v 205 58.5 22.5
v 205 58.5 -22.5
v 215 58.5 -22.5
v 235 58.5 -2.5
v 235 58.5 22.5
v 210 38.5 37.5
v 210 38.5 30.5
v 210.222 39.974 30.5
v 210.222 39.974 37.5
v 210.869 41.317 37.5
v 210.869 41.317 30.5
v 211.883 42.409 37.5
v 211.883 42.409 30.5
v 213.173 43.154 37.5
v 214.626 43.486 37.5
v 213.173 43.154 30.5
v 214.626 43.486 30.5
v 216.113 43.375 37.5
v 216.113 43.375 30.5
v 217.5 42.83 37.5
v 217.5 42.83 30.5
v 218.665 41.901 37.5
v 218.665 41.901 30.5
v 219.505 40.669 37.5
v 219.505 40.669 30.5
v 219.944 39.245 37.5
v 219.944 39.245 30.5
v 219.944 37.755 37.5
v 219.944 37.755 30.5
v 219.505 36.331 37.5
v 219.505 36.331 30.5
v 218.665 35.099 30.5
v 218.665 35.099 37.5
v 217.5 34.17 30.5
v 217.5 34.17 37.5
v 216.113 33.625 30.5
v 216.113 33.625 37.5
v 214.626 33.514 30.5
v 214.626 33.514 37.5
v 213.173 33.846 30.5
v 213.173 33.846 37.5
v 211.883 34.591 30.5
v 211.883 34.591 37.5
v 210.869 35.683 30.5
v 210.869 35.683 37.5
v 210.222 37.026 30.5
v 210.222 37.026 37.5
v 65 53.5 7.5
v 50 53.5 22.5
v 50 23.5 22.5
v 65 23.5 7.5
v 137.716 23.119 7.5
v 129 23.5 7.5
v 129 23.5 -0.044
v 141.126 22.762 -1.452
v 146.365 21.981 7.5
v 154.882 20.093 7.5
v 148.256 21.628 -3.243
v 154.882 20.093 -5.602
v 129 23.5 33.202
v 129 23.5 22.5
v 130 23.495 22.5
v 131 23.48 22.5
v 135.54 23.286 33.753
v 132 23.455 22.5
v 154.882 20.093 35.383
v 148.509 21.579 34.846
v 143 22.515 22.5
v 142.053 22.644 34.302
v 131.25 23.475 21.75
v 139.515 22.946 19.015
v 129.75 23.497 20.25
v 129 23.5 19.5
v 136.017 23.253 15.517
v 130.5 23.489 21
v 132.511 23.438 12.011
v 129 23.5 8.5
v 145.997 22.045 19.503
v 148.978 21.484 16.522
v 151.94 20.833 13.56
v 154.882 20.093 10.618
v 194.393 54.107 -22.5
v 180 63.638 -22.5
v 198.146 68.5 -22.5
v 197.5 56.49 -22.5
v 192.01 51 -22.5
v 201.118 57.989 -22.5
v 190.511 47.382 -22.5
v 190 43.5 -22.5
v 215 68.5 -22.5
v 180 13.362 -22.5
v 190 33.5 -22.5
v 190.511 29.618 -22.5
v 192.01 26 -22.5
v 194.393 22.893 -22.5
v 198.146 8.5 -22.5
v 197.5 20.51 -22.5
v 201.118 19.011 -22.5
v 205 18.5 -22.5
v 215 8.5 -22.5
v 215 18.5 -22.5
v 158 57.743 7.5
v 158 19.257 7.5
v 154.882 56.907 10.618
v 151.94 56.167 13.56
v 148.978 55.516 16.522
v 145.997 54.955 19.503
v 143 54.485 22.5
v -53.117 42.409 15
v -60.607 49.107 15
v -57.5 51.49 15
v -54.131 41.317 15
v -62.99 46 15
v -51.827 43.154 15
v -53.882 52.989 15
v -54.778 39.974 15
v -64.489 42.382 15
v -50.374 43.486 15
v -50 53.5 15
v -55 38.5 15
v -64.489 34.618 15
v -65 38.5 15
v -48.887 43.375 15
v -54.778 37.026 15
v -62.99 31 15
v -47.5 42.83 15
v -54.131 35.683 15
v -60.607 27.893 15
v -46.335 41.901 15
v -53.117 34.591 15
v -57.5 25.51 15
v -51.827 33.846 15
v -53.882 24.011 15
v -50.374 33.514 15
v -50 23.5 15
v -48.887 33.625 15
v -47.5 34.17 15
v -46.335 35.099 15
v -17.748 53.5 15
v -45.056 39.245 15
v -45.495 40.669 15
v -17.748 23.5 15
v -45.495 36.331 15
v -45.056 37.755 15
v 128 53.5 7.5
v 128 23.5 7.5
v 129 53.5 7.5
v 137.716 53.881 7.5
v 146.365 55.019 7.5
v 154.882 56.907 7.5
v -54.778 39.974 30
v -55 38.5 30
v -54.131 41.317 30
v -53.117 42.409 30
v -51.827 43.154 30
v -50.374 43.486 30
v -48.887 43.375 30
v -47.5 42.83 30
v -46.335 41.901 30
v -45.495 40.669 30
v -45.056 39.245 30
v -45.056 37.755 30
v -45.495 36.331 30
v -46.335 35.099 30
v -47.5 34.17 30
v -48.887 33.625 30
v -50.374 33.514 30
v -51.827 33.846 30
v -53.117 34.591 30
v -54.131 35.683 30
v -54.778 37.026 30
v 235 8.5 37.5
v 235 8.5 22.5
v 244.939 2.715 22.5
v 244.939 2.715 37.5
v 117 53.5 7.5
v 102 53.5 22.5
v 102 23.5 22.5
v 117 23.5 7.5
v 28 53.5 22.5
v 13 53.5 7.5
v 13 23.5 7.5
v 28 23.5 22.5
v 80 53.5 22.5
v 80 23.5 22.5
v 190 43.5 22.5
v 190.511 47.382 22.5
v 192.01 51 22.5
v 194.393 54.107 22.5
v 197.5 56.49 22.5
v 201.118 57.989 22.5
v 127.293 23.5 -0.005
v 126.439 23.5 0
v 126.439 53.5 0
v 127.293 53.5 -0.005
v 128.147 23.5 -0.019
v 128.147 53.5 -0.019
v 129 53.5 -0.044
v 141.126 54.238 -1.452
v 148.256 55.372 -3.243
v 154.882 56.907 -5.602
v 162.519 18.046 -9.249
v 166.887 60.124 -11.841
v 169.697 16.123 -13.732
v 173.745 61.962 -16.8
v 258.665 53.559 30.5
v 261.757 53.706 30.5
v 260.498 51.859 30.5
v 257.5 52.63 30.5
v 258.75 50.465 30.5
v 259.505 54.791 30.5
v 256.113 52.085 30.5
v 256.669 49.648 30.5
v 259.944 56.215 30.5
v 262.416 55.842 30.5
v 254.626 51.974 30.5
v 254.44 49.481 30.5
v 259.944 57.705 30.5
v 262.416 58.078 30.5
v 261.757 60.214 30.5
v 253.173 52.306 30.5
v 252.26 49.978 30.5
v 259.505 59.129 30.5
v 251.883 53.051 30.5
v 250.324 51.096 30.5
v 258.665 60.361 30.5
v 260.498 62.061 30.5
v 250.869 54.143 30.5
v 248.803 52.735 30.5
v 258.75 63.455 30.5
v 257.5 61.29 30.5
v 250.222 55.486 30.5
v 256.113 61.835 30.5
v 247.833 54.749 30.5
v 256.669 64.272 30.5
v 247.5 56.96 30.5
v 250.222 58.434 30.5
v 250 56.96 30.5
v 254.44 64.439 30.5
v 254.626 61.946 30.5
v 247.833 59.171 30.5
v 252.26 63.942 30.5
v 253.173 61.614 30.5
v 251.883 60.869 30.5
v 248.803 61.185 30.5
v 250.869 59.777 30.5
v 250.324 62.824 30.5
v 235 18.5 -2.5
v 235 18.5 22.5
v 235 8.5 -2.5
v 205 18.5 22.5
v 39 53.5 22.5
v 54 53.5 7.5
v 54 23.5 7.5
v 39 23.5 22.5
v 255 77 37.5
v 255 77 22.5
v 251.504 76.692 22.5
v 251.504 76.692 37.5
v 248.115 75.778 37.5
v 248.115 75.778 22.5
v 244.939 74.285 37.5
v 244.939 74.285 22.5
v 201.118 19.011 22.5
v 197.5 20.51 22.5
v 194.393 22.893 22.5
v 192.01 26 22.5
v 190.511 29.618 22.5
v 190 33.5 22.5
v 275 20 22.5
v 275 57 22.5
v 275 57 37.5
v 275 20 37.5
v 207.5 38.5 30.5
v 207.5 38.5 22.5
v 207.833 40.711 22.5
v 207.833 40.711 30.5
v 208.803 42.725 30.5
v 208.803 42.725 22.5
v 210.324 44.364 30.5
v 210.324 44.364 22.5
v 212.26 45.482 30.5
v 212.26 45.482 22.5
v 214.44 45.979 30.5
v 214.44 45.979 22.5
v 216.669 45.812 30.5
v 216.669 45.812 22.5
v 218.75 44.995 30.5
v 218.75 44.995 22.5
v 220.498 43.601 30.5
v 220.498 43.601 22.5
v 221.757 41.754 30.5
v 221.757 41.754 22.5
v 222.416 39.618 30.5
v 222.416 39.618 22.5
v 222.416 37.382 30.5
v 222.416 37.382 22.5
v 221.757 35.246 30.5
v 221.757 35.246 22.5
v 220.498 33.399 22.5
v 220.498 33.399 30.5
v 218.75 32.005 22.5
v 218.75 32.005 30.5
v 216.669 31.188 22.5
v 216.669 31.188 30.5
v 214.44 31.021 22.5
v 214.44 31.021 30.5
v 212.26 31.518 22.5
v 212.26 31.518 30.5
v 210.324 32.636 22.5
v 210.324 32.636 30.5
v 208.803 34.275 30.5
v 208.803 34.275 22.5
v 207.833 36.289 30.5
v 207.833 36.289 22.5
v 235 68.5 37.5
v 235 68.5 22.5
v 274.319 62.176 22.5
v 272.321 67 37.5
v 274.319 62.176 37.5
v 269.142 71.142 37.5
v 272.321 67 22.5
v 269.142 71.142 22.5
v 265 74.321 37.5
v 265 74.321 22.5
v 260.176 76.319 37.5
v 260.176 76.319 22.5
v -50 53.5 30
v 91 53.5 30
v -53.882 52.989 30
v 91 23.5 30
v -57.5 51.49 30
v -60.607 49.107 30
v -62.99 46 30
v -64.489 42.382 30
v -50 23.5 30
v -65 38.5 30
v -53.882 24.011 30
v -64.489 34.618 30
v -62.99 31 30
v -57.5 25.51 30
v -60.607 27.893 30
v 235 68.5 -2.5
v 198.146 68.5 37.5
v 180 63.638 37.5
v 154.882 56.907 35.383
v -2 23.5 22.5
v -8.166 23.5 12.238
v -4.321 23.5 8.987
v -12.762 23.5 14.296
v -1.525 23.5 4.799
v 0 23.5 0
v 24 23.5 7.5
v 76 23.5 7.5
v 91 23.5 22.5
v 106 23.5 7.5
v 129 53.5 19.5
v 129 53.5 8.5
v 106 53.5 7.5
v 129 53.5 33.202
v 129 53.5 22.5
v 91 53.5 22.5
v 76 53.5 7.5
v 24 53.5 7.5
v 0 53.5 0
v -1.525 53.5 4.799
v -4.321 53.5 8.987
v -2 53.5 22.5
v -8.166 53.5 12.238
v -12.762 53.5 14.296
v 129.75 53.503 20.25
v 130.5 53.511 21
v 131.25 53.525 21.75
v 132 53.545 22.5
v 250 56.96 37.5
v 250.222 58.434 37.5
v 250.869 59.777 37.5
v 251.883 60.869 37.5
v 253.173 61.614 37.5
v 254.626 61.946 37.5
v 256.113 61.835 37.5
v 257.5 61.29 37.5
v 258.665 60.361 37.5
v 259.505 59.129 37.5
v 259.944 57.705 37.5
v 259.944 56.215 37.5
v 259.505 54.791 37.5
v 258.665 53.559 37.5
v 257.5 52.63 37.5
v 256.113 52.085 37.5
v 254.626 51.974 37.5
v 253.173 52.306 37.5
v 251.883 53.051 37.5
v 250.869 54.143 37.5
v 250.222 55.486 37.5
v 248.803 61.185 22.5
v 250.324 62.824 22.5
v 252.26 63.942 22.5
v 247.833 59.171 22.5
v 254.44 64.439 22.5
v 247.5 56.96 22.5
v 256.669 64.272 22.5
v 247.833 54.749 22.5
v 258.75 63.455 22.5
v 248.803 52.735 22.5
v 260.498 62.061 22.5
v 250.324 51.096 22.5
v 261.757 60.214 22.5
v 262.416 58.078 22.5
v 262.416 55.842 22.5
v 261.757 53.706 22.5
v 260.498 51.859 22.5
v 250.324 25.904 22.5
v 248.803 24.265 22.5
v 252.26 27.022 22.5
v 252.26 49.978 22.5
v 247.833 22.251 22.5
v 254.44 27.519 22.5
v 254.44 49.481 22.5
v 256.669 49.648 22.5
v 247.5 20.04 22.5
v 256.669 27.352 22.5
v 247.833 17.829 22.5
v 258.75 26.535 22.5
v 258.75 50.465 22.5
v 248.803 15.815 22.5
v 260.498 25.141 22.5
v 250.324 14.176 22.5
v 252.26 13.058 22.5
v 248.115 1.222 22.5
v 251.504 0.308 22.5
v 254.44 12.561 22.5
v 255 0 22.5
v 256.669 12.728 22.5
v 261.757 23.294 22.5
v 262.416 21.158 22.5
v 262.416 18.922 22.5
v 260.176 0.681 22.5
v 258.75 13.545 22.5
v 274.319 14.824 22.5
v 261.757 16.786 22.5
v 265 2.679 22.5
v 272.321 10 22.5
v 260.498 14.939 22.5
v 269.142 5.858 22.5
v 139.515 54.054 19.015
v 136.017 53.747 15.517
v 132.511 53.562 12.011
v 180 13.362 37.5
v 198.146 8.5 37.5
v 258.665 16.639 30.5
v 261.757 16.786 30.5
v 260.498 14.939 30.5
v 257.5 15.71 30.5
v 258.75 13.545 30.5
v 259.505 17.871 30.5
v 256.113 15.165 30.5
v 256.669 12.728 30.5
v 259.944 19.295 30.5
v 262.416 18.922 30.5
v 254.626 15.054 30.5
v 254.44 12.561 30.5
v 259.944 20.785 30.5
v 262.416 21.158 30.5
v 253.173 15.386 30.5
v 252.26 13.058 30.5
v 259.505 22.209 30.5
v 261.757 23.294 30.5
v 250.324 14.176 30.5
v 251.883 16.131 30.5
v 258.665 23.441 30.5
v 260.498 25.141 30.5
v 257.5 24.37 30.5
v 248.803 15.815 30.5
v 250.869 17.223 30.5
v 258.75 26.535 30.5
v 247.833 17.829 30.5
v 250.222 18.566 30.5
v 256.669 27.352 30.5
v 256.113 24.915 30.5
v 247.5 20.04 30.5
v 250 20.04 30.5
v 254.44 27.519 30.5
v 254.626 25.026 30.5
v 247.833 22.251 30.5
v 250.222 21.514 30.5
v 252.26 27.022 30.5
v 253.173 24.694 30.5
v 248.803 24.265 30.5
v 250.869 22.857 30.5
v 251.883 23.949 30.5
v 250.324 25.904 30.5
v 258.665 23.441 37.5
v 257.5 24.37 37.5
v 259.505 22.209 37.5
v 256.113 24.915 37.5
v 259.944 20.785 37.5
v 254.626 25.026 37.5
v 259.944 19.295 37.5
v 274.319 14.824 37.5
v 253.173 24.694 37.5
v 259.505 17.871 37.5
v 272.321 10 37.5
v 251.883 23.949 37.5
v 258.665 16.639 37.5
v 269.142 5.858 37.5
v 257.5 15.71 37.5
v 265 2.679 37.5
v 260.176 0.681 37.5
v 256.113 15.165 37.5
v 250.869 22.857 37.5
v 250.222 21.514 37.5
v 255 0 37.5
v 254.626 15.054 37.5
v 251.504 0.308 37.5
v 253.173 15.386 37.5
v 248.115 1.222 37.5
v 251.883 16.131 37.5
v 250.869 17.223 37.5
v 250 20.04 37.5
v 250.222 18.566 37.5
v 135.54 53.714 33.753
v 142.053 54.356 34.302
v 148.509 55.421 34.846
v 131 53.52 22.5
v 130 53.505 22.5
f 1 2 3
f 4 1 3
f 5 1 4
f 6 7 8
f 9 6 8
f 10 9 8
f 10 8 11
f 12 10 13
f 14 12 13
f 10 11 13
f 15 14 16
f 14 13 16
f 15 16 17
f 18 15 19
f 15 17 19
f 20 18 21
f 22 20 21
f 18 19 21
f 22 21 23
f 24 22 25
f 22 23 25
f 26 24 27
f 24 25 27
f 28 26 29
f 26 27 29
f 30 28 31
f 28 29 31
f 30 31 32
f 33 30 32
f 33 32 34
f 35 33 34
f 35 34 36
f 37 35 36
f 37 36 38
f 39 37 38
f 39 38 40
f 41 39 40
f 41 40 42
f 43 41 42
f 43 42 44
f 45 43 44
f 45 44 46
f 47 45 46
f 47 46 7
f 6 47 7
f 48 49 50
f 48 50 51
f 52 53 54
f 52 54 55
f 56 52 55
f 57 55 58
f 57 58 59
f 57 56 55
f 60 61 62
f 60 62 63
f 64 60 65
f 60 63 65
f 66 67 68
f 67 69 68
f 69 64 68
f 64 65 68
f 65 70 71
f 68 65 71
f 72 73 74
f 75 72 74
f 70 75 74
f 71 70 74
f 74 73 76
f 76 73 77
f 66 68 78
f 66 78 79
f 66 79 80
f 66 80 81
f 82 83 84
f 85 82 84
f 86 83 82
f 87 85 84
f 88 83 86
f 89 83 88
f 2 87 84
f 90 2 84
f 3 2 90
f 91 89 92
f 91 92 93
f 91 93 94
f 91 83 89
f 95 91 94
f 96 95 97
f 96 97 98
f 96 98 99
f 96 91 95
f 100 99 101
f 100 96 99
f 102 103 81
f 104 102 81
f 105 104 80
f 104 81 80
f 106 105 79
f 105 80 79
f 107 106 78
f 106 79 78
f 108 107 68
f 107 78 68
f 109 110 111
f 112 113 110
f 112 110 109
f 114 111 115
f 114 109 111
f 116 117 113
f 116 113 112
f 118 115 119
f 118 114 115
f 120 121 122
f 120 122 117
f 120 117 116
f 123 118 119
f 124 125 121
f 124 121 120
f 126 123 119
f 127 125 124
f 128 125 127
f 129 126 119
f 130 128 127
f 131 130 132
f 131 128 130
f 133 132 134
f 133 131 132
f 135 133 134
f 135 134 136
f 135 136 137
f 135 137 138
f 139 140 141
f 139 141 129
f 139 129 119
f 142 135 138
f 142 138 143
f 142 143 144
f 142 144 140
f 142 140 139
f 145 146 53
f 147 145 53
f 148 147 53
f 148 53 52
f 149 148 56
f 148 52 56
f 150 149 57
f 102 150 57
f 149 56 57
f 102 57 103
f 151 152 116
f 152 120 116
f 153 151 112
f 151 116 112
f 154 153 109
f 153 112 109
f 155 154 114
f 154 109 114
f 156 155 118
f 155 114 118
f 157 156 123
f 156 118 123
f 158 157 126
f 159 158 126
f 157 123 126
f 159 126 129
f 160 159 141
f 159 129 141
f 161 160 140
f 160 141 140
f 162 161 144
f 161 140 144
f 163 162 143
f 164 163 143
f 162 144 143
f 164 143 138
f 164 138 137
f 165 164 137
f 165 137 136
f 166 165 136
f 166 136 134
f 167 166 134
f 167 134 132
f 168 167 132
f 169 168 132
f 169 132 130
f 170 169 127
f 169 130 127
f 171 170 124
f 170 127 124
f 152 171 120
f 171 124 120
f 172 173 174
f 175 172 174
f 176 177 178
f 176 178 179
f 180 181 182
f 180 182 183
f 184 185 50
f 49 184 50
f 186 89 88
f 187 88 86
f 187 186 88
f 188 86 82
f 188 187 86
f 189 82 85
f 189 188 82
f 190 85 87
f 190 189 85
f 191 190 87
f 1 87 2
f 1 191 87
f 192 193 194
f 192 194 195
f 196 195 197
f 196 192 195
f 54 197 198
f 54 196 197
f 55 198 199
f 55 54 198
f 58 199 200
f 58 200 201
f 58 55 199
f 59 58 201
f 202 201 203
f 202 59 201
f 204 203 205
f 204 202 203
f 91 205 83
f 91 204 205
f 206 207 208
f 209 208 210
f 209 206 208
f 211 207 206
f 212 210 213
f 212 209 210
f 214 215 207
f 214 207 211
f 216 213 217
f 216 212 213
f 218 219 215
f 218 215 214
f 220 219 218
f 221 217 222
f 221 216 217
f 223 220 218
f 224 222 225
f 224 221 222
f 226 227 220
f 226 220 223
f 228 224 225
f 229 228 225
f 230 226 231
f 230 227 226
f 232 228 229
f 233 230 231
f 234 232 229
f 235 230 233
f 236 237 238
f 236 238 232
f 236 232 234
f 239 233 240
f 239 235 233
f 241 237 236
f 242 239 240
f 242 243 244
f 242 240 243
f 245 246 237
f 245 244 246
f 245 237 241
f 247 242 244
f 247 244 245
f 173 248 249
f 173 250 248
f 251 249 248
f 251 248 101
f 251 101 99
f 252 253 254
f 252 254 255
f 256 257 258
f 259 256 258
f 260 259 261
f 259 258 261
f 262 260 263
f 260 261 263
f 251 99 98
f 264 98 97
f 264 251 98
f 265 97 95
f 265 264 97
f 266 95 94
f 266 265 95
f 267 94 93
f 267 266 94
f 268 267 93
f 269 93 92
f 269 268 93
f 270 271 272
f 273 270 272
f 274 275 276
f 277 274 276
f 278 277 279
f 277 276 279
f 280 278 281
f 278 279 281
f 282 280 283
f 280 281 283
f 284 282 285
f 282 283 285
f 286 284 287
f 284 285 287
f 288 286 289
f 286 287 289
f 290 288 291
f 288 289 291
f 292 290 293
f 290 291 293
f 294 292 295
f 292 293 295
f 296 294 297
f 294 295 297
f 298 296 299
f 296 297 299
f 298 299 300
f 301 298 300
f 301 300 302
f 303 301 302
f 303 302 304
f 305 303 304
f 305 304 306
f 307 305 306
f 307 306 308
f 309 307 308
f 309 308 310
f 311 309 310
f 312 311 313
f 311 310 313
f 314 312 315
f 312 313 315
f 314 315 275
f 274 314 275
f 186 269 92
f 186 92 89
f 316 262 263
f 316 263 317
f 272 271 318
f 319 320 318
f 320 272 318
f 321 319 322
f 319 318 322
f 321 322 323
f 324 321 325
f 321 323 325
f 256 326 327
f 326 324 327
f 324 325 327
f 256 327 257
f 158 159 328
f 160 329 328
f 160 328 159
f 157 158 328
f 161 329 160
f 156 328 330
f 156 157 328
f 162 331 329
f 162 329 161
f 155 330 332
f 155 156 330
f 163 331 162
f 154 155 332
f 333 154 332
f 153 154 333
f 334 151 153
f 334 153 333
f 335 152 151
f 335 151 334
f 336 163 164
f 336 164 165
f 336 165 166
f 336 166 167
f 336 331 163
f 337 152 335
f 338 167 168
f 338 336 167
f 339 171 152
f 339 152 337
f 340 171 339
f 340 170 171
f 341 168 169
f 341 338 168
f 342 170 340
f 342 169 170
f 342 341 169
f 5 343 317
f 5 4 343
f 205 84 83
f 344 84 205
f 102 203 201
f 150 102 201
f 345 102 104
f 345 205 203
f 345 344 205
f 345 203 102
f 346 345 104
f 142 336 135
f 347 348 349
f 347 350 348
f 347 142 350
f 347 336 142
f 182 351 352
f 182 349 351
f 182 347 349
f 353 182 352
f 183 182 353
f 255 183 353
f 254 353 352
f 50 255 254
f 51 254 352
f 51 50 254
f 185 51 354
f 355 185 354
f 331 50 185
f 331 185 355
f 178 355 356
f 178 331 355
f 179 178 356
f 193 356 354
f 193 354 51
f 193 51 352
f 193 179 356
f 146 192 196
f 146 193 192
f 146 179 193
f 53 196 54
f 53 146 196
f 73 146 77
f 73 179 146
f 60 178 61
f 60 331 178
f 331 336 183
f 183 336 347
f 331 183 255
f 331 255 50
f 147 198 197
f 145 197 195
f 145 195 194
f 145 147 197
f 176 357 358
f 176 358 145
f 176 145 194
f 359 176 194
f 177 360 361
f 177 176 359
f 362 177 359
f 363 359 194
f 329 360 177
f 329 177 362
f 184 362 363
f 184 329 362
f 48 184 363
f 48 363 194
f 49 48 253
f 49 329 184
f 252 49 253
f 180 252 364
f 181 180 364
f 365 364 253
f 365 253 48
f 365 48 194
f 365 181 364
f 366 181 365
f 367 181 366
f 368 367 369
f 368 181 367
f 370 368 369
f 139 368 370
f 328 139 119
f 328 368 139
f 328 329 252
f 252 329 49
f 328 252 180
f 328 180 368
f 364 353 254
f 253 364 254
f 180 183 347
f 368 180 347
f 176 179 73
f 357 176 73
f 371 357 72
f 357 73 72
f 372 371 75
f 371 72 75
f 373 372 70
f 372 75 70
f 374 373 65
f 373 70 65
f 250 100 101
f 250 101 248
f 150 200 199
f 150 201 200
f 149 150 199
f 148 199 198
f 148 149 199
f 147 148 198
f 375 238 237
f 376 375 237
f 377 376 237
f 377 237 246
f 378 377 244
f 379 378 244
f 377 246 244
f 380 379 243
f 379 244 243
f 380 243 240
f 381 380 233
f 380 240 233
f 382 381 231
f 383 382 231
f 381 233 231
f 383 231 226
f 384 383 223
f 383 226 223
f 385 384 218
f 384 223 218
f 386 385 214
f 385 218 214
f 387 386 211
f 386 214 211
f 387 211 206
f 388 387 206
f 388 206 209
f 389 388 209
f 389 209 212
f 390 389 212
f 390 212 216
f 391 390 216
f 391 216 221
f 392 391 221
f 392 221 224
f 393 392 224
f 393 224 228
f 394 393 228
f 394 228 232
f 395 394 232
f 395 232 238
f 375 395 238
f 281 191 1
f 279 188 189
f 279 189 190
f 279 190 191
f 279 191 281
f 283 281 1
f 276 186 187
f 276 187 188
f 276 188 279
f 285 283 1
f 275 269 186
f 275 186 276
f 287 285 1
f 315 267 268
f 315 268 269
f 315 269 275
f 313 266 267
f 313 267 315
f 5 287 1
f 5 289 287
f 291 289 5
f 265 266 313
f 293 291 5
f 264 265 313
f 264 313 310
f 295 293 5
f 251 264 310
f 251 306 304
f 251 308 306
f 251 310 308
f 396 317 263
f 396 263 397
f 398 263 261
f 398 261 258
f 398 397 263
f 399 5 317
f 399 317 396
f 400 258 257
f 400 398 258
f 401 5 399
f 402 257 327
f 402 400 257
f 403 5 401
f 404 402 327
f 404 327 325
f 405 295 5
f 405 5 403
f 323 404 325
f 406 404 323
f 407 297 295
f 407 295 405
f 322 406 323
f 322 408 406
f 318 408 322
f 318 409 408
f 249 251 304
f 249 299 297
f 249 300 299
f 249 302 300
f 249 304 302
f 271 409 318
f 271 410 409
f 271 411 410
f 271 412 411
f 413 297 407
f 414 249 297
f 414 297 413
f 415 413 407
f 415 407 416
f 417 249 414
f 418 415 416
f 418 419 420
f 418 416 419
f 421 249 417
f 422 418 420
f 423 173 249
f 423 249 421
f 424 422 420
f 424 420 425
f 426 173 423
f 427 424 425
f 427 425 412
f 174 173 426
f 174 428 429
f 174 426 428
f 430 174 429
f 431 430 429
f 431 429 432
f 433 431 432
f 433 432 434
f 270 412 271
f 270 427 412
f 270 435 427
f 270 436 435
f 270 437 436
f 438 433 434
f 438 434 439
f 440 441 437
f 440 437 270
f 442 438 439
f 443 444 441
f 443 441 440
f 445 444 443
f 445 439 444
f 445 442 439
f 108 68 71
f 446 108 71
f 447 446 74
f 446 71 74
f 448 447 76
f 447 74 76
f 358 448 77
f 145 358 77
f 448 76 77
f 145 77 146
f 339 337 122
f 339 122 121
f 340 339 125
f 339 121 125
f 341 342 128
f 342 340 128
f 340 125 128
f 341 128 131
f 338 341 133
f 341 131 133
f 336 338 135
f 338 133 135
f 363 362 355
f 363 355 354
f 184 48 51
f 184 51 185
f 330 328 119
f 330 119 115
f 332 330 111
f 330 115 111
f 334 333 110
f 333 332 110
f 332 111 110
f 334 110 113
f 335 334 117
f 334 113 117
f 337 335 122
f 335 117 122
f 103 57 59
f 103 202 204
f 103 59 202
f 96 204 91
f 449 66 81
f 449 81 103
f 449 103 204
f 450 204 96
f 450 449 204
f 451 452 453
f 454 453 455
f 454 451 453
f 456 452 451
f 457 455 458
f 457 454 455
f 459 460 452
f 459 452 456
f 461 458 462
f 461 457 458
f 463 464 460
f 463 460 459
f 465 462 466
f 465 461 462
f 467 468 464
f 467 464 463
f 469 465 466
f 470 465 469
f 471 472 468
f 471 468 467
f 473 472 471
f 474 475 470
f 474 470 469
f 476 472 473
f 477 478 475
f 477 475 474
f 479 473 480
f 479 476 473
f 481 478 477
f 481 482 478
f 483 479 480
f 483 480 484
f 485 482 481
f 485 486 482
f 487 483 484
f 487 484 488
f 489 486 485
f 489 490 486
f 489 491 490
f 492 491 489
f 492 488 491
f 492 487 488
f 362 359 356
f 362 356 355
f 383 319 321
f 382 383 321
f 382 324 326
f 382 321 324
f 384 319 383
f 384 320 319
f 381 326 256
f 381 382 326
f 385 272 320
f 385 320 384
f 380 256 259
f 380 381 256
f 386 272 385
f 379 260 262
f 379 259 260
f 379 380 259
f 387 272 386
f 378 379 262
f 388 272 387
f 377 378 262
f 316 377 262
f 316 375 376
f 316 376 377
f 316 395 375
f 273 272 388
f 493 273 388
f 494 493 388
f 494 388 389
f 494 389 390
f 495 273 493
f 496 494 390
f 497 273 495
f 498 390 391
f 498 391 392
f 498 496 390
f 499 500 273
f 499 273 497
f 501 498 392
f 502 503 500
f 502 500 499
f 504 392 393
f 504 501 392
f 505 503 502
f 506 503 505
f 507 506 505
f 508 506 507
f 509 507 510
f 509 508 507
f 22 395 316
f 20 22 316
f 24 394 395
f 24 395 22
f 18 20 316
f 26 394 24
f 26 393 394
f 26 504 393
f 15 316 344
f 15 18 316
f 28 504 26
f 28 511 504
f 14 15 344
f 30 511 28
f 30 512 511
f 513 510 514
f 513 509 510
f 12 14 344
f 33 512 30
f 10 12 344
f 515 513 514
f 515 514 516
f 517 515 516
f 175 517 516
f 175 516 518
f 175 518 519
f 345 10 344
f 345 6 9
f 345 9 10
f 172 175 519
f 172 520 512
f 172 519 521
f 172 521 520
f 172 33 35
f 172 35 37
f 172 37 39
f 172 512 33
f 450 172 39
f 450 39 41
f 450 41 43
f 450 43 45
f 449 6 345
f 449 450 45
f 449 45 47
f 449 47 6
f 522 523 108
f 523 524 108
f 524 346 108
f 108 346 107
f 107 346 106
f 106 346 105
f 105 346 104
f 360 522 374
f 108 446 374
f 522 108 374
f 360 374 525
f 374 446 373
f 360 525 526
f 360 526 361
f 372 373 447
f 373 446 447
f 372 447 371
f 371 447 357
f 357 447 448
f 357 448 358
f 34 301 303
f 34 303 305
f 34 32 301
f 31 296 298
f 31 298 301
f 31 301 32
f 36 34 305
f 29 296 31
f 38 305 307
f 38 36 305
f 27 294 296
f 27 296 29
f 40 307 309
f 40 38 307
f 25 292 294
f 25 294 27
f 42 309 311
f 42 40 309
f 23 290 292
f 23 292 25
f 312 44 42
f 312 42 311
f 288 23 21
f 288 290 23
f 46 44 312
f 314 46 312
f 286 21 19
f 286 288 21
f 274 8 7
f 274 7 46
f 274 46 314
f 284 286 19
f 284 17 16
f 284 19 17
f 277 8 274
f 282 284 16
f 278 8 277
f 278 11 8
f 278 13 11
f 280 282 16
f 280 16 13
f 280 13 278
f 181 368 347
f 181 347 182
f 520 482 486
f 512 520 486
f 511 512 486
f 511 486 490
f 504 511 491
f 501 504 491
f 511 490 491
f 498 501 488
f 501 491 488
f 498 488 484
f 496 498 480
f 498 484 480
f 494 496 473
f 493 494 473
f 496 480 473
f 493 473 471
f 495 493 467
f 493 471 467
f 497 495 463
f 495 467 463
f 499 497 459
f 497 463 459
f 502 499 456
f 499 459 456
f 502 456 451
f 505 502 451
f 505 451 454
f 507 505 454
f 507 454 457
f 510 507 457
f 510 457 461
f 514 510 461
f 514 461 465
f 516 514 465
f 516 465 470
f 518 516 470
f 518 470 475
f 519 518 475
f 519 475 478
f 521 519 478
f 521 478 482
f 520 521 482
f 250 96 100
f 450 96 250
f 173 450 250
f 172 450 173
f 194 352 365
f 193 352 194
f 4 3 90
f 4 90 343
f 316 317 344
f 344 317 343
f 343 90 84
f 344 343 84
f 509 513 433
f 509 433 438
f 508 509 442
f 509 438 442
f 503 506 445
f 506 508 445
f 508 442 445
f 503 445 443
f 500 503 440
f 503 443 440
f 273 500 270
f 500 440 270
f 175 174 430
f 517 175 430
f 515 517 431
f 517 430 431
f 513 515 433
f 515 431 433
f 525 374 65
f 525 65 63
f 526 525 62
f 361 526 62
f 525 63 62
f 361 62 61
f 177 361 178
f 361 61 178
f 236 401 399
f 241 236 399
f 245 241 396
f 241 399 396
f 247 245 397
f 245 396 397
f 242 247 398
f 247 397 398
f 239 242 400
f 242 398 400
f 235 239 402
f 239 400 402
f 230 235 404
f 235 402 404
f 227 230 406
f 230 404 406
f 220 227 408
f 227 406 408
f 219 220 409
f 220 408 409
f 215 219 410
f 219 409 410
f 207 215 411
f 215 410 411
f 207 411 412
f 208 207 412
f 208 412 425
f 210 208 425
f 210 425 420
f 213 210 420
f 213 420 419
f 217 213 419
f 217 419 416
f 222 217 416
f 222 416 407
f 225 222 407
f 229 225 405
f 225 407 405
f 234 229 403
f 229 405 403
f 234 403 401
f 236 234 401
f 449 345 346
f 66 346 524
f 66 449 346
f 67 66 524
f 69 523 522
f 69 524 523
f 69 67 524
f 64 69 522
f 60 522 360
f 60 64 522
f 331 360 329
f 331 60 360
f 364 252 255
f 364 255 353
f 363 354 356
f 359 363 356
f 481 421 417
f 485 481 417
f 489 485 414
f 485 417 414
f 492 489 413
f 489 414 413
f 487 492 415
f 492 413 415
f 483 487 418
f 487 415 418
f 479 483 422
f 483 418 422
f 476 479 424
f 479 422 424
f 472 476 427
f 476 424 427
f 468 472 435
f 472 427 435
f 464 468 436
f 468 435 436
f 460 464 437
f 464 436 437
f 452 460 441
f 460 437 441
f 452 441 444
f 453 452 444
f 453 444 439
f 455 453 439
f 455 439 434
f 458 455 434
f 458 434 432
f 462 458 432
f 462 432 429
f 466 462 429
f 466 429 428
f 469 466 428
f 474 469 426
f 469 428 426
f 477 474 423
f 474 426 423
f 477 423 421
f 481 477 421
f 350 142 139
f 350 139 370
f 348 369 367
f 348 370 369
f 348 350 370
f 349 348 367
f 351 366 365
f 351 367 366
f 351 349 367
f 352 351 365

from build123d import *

# Parameters (mm, degrees)
BOSS_EXTRUDE1_DEPTH     = 77
SKETCH2_W               = 126.439286786
SKETCH2_H               = 23.5
CUT_EXTRUDE1_DEPTH      = 23.5
CUT_EXTRUDE1_DEPTH_BACK = 38.5
CUT_EXTRUDE2_DEPTH      = 23.5000001
CUT_EXTRUDE2_DEPTH_BACK = 22.5
SKETCH3_R               = 5
CUT_EXTRUDE3_DEPTH      = 46.0000001
CUT_EXTRUDE3_DEPTH_BACK = 16
SKETCH4_R               = 7.5
SKETCH4_R_2             = 5
CUT_EXTRUDE4_DEPTH      = 8


with BuildPart() as part:
    # Sketch1 → Boss-Extrude1 (new body)
    with BuildSketch(Plane(origin=(0, 0, 0), x_dir=(1, 0, 0), z_dir=(0, 1, 0))):
        with BuildLine():
            Line((0, 0), (126.439286786, 0))
            ThreePointArc((126.439286786, 0), (155.486661882, 5.85341657), (180, 22.5))
            Line((180, 22.5), (215, 22.5))
            Line((215, 22.5), (235, 2.5))
            Line((235, 2.5), (235, -22.5))
            Line((235, -22.5), (275, -22.5))
            Line((275, -22.5), (275, -37.5))
            Line((275, -37.5), (180, -37.5))
            Line((180, -37.5), (91, -30))
            Line((91, -30), (-65, -30))
            Line((-65, -30), (-65, -15))
            Line((-65, -15), (-17.748239349, -15))
            ThreePointArc((-17.748239349, -15), (-6.129289311, -10.747727085), (0, 0))
        make_face()
        Polygon((-2, -22.5), (13, -7.5), (28, -22.5), align=None, mode=Mode.SUBTRACT)
        Polygon((50, -22.5), (65, -7.5), (80, -22.5), align=None, mode=Mode.SUBTRACT)
        Polygon((54, -7.5), (39, -22.5), (24, -7.5), align=None, mode=Mode.SUBTRACT)
        Polygon((106, -7.5), (91, -22.5), (76, -7.5), align=None, mode=Mode.SUBTRACT)
        Polygon((158, -7.5), (143, -22.5), (128, -7.5), align=None, mode=Mode.SUBTRACT)
        Polygon((102, -22.5), (117, -7.5), (132, -22.5), align=None, mode=Mode.SUBTRACT)
    extrude(amount=BOSS_EXTRUDE1_DEPTH)

    # Sketch2 → Cut-Extrude1 (cut, two sides)
    with BuildSketch(Plane(origin=(0, 0, 0), x_dir=(-1, 0, 0), z_dir=(0, 0, -1))) as cut_extrude1_sk:
        with Locations((-63.219643393, 11.75)):
            Rectangle(SKETCH2_W, SKETCH2_H)
        with BuildLine():
            Line((50, 23.5), (0, 23.5))
            Line((0, 23.5), (0, 0))
            Line((0, 0), (65, 0))
            Line((65, 0), (65, 38.5))
            ThreePointArc((65, 38.5), (60.606601718, 27.893398282), (50, 23.5))
        make_face()
        with BuildLine():
            Line((0, 77), (0, 53.5))
            Line((0, 53.5), (50, 53.5))
            ThreePointArc((50, 53.5), (60.606601718, 49.106601718), (65, 38.5))
            Line((65, 38.5), (65, 77))
            Line((65, 77), (0, 77))
        make_face()
        with Locations((-63.219643393, 65.25)):
            Rectangle(SKETCH2_W, SKETCH2_H)
        with BuildLine():
            ThreePointArc((-154.88190451, 56.907417371), (-142.052619222, 54.355513863), (-129, 53.5))
            Line((-129, 53.5), (-126.439286786, 53.5))
            Line((-126.439286786, 53.5), (-126.439286786, 77))
            Line((-126.439286786, 77), (-255, 77))
            ThreePointArc((-255, 77), (-249.789539733, 76.309352755), (-244.938938469, 74.28511038))
            Line((-244.938938469, 74.28511038), (-235, 68.5))
            Line((-235, 68.5), (-198.146011872, 68.5))
            Line((-198.146011872, 68.5), (-154.88190451, 56.907417371))
        make_face()
        with BuildLine():
            ThreePointArc((-129, 23.5), (-142.052619222, 22.644486137), (-154.88190451, 20.092582629))
            Line((-154.88190451, 20.092582629), (-198.146011872, 8.5))
            Line((-198.146011872, 8.5), (-235, 8.5))
            Line((-235, 8.5), (-244.938938469, 2.71488962))
            ThreePointArc((-244.938938469, 2.71488962), (-249.789539733, 0.690647245), (-255, 0))
            Line((-255, 0), (-126.439286786, 0))
            Line((-126.439286786, 0), (-126.439286786, 23.5))
            Line((-126.439286786, 23.5), (-129, 23.5))
        make_face()
        with BuildLine():
            Line((-275, 0), (-255, 0))
            ThreePointArc((-255, 0), (-269.142135624, 5.857864376), (-275, 20))
            Line((-275, 20), (-275, 0))
        make_face()
        with BuildLine():
            ThreePointArc((-275, 57), (-269.142135624, 71.142135624), (-255, 77))
            Line((-255, 77), (-275, 77))
            Line((-275, 77), (-275, 57))
        make_face()
    extrude(amount=CUT_EXTRUDE1_DEPTH, mode=Mode.SUBTRACT)
    extrude(cut_extrude1_sk.sketch, amount=-CUT_EXTRUDE1_DEPTH_BACK, mode=Mode.SUBTRACT)

    # Sketch2<3> → Cut-Extrude2 (cut, two sides)
    with BuildSketch(Plane(origin=(0, 0, 0), x_dir=(-1, 0, 0), z_dir=(0, 0, -1))) as cut_extrude2_sk:
        with BuildLine():
            Line((-244.938938469, 2.71488962), (-235, 8.5))
            Line((-235, 8.5), (-235, 18.5))
            Line((-235, 18.5), (-205, 18.5))
            ThreePointArc((-205, 18.5), (-194.393398282, 22.893398282), (-190, 33.5))
            Line((-190, 33.5), (-190, 43.5))
            ThreePointArc((-190, 43.5), (-194.393398282, 54.106601718), (-205, 58.5))
            Line((-205, 58.5), (-235, 58.5))
            Line((-235, 58.5), (-235, 68.5))
            Line((-235, 68.5), (-244.938938469, 74.28511038))
            ThreePointArc((-244.938938469, 74.28511038), (-237.661873939, 66.969422485), (-235, 57))
            Line((-235, 57), (-235, 20))
            ThreePointArc((-235, 20), (-237.661873939, 10.030577515), (-244.938938469, 2.71488962))
        make_face()
    extrude(amount=CUT_EXTRUDE2_DEPTH, mode=Mode.SUBTRACT)
    extrude(cut_extrude2_sk.sketch, amount=-CUT_EXTRUDE2_DEPTH_BACK, mode=Mode.SUBTRACT)

    # Sketch3 → Cut-Extrude3 (cut, two sides)
    with BuildSketch(Plane(origin=(0, 0, 22.5), x_dir=(-1, 0, 0), z_dir=(0, 0, -1))) as cut_extrude3_sk:
        with Locations((-215, 38.5)):
            Circle(SKETCH3_R)
        with Locations((-255, 20.04)):
            Circle(SKETCH3_R)
        with Locations((-255, 56.96)):
            Circle(SKETCH3_R)
        with Locations((50, 38.5)):
            Circle(SKETCH3_R)
    extrude(amount=CUT_EXTRUDE3_DEPTH, mode=Mode.SUBTRACT)
    extrude(cut_extrude3_sk.sketch, amount=-CUT_EXTRUDE3_DEPTH_BACK, mode=Mode.SUBTRACT)

    # Sketch4 → Cut-Extrude4 (cut)
    with BuildSketch(Plane(origin=(0, 0, 22.5), x_dir=(-1, 0, 0), z_dir=(0, 0, -1))):
        with Locations((-215, 38.5)):
            Circle(SKETCH4_R)
        with Locations((-215, 38.5)):
            Circle(SKETCH4_R_2, mode=Mode.SUBTRACT)
        with Locations((-255, 20.04)):
            Circle(SKETCH4_R)
        with Locations((-255, 20.04)):
            Circle(SKETCH4_R_2, mode=Mode.SUBTRACT)
        with Locations((-255, 56.96)):
            Circle(SKETCH4_R)
        with Locations((-255, 56.96)):
            Circle(SKETCH4_R_2, mode=Mode.SUBTRACT)
    extrude(amount=-CUT_EXTRUDE4_DEPTH, mode=Mode.SUBTRACT)


solid = part.part
